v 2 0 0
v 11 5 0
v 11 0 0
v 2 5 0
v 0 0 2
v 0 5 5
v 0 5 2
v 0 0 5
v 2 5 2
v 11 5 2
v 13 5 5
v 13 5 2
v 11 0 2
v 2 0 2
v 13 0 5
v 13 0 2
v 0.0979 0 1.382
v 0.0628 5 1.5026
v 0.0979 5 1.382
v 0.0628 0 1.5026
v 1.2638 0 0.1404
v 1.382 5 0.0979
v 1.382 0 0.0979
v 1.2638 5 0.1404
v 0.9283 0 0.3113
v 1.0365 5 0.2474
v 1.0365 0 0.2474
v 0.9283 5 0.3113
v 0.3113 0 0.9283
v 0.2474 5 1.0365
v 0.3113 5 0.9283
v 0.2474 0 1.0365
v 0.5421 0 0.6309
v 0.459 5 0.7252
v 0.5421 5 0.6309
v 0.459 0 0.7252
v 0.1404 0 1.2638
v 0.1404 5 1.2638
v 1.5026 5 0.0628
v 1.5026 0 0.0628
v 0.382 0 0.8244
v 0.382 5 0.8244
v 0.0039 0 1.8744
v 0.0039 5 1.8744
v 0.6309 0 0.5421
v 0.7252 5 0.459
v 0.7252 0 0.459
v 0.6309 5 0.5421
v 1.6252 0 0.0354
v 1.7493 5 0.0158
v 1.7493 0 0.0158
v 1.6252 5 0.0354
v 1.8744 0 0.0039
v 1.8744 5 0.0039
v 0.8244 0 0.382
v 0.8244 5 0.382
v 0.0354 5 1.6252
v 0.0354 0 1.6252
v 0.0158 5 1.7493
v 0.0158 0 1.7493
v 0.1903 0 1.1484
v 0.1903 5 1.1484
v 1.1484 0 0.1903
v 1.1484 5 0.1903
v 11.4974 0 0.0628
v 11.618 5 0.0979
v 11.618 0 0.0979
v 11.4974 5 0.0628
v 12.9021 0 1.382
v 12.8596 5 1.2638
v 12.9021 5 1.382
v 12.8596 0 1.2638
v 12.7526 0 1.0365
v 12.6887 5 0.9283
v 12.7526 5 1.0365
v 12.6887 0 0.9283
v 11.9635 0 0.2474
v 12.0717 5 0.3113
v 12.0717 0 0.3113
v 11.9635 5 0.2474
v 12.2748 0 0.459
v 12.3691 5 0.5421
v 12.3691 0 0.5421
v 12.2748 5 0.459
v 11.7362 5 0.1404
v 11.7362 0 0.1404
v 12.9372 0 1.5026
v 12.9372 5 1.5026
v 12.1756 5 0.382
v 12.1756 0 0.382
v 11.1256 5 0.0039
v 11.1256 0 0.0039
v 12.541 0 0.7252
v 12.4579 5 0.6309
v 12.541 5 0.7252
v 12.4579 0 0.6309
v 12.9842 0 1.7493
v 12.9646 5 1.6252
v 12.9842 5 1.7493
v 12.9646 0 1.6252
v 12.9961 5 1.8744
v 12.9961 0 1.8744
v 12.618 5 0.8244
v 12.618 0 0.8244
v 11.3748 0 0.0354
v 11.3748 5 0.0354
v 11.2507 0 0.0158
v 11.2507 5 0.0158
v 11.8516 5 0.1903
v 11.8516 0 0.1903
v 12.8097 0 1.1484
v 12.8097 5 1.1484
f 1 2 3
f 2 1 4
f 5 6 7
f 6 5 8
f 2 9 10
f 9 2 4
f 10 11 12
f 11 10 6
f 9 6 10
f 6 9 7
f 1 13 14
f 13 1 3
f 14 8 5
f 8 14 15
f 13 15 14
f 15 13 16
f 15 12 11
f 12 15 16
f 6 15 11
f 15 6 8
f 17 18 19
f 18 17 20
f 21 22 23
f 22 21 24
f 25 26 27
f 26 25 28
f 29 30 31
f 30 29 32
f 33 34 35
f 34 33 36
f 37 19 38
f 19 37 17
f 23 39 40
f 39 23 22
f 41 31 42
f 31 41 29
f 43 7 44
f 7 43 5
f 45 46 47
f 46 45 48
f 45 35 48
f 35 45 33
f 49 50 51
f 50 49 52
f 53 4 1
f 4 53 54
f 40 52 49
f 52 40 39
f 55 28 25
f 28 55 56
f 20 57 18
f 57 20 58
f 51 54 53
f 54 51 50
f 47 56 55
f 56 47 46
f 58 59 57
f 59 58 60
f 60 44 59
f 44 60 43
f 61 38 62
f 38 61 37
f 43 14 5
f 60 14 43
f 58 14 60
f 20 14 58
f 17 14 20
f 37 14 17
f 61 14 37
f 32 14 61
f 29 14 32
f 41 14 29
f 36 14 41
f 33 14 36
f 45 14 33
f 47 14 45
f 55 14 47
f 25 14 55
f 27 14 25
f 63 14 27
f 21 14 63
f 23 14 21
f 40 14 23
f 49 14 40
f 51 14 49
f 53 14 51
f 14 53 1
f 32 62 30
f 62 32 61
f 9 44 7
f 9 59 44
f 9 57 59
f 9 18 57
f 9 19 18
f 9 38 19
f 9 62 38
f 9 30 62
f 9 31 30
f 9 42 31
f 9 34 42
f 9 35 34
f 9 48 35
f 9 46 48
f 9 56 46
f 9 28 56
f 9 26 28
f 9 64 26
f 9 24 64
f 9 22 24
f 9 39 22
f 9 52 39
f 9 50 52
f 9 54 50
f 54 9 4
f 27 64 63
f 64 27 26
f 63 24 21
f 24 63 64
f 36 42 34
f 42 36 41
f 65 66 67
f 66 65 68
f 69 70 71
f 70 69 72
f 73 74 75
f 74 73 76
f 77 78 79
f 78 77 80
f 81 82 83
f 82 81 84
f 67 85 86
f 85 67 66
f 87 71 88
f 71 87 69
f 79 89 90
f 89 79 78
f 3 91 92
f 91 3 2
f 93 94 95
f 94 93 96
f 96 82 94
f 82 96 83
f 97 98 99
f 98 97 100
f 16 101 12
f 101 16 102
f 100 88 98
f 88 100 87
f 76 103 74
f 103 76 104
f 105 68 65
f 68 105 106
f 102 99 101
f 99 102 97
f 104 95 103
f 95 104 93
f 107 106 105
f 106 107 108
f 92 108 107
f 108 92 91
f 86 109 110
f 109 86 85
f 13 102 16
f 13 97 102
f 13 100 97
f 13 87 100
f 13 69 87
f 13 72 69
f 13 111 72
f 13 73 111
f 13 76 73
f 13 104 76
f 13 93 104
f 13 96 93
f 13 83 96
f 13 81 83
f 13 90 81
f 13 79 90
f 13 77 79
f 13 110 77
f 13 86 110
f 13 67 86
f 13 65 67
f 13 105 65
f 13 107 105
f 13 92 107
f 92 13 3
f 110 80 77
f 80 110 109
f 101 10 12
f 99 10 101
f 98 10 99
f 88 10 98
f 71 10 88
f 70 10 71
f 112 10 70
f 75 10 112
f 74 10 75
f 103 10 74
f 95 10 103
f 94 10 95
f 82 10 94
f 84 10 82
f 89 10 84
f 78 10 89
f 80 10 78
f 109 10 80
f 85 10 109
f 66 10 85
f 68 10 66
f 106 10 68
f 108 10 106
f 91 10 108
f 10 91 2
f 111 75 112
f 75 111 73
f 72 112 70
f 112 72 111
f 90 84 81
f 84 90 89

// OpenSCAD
// file: smoothed_edge.scad
module smoothed_edge(radius=1.5, height=64) {
  difference() {
    difference() {
      color([1, 0, 0]) cylinder(h=height, r=radius);
      translate([-radius, 0, 0]) {
        color([0, 1, 0]) cube([radius * 2, radius, height]);
      }
    }

    translate([0, -radius, 0]) {
      color([0, 1, 0]) cube([radius, radius * 2, height]);
    }
  }
}
// file: smoothed_corner.scad
$fn=200;
module smoothed_corner(radius=5) {
  difference() {
    sphere(radius);
    union() {
      translate([0,-5,-5]) {
        cube([5,10,10]);
      }

      translate([-10,0,-5]) {
        cube([10, 10, 10]);
      }

      translate([-5,-5,0]) {
        cube([10,10,10]);
      }
    }

  }
}

smoothed_corner();
// main file
use <smoothed_cube.scad>
  // stopper
  // translate([11.5,-5,0]) {
    color([0,1,0])
      smoothed_cube(
        x=13,
        y=5,
        z=5,
        edge_2_6_radius=2,
        edge_3_7_radius=2
      );
  // }
